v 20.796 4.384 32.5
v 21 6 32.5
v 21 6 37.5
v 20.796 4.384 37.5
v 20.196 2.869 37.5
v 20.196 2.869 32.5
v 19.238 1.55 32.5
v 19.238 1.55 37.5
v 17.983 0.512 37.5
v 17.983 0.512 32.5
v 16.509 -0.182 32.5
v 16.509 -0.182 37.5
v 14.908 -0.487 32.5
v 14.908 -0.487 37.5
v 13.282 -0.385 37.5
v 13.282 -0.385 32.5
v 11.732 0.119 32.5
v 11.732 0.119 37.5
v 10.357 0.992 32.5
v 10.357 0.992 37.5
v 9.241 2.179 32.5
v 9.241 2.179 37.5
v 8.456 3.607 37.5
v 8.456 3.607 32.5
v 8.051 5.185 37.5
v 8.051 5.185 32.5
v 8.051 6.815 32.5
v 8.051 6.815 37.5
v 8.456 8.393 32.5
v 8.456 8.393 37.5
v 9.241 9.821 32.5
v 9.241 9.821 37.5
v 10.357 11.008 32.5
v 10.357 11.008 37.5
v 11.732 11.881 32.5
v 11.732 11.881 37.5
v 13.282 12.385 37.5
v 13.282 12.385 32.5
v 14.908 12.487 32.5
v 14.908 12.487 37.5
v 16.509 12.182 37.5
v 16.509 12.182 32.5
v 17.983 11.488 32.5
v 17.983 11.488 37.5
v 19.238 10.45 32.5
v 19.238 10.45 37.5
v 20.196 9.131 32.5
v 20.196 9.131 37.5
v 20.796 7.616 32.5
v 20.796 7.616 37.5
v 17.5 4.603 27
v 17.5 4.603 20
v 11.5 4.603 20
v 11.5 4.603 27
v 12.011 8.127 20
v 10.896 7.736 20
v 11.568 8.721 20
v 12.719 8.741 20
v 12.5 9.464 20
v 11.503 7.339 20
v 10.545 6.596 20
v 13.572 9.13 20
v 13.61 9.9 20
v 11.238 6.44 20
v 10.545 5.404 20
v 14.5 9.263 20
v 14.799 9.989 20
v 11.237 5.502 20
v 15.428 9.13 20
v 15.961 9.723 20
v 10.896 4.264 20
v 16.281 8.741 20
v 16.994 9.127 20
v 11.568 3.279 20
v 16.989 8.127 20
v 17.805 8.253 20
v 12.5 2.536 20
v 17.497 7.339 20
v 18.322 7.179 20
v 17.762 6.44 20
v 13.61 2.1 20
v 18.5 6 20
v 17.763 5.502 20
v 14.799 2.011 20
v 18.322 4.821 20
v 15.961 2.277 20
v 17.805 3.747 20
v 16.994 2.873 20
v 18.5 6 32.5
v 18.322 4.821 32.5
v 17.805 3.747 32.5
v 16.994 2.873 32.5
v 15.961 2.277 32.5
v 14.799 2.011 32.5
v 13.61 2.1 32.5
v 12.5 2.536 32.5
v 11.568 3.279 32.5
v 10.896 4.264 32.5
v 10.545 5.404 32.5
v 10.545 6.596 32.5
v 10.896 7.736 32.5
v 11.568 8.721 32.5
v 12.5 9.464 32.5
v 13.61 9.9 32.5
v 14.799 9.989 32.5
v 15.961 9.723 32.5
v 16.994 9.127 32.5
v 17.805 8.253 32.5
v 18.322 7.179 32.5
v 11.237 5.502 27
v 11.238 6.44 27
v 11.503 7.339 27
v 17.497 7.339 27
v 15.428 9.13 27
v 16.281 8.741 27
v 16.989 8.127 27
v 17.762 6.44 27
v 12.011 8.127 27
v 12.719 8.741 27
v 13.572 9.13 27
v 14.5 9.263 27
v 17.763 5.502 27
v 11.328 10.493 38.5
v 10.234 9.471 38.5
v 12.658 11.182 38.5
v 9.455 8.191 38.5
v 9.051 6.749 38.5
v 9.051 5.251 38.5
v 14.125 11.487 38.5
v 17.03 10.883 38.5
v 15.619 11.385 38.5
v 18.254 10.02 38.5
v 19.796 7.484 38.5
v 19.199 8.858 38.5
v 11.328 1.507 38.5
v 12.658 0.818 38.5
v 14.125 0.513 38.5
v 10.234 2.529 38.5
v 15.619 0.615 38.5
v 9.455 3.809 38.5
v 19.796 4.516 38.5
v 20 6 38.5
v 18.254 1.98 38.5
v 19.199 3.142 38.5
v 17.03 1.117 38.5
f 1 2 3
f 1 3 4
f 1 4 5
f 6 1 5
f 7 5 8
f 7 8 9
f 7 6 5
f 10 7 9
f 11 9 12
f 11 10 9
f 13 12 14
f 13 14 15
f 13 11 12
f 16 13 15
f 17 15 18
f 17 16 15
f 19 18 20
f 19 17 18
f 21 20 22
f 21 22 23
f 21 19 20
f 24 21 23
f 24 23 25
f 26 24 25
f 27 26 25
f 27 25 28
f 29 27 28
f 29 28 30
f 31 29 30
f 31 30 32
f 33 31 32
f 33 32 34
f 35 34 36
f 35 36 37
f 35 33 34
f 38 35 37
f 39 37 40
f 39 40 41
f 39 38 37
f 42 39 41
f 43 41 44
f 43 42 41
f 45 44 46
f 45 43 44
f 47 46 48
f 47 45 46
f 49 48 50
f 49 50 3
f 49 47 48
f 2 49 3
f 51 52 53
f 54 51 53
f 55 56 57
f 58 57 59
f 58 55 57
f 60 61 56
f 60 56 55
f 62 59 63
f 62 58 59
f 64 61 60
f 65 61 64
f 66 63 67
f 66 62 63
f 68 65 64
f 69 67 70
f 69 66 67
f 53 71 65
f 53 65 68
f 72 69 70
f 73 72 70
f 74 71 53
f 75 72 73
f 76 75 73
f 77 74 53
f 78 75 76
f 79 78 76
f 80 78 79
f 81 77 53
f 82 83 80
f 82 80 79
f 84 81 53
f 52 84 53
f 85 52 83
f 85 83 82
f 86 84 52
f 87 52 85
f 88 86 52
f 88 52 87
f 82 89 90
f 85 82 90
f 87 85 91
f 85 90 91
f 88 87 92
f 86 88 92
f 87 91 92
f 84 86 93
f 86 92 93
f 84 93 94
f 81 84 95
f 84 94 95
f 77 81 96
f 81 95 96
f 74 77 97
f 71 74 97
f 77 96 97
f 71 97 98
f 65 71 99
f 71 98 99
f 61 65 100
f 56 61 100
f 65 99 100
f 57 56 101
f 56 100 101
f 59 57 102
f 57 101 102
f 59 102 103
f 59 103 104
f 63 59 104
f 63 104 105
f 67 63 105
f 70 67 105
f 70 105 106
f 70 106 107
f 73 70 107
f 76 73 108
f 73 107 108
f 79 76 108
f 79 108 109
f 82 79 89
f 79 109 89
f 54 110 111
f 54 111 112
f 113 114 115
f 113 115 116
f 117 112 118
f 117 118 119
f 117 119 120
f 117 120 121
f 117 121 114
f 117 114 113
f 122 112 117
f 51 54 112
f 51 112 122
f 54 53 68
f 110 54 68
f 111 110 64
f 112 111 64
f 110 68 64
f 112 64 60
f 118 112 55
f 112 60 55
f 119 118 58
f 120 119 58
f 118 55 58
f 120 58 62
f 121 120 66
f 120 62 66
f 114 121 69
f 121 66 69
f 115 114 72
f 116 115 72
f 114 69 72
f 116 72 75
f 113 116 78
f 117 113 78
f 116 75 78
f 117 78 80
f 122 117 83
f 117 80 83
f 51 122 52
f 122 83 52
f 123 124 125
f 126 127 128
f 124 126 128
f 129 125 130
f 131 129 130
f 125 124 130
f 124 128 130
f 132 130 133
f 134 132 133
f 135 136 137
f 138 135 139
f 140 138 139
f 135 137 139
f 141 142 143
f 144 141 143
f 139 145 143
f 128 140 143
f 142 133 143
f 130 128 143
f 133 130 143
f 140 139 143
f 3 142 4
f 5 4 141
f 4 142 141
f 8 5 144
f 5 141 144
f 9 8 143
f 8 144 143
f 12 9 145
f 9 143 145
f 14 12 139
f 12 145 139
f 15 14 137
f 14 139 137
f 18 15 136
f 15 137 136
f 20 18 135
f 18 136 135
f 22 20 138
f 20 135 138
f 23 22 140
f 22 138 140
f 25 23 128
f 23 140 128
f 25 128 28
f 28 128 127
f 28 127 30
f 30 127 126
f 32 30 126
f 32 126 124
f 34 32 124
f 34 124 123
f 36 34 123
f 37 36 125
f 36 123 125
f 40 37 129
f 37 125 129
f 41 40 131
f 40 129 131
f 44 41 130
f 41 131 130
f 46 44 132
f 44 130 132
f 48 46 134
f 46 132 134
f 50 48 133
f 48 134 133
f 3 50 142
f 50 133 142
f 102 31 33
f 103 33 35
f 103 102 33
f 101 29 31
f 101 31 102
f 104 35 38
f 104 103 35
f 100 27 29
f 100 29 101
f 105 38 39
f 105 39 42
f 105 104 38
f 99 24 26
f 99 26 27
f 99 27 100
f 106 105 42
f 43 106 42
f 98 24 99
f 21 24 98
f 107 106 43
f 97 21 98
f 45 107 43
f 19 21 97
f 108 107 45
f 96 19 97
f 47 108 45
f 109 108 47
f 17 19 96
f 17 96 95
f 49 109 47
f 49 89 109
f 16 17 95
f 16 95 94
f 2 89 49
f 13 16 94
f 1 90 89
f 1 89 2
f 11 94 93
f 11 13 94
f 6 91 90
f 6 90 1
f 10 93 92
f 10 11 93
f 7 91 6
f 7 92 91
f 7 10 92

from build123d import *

# Parameters (mm, degrees)
SKETCH063_R     = 6.5
PAD036_DEPTH    = 6
CHAMFER002_SIZE = 1
SKETCH066_R     = 4
PAD038_DEPTH    = 12.5
POCKET030_DEPTH = 7


with BuildPart() as part:
    # Sketch063 → Pad036 (new body)
    with BuildSketch(Plane(origin=(0, 0, 30), x_dir=(1, 0, 0), z_dir=(0, 0, -1))):
        with Locations((14.5, -4)):
            Circle(SKETCH063_R)
    extrude(amount=-PAD036_DEPTH)

    # Chamfer002
    chamfer002_edges = [part.edges().sort_by_distance(p)[0] for p in [
        (8, 4, 36),
    ]]
    chamfer(chamfer002_edges, length=CHAMFER002_SIZE)

    # Sketch066 (on Face3 of Chamfer002) → Pad038 (join)
    with BuildSketch(Plane(origin=(0, 0, 30), x_dir=(1, 0, 0), z_dir=(0, 0, -1))):
        with Locations((14.5, -4)):
            Circle(SKETCH066_R)
    extrude(amount=PAD038_DEPTH)

    # Sketch067 (on Face5 of Pad038) → Pocket030 (cut)
    with BuildSketch(Plane(origin=(0, 0, 17.5), x_dir=(1, 0, 0), z_dir=(0, 0, -1))):
        with BuildLine():
            ThreePointArc((11.5, -2.602698), (14.5, -7.263055), (17.5, -2.602698))
            Line((14.5, -2.602698), (17.5, -2.602698))
            Line((14.5, -2.602698), (11.5, -2.602698))
        make_face()
    extrude(amount=-POCKET030_DEPTH, mode=Mode.SUBTRACT)


with BuildPart() as part_1:
    # Body005 placement: moved
    add(part.part.moved(Location((0, 2, 2.5))))


solid = part_1.part
